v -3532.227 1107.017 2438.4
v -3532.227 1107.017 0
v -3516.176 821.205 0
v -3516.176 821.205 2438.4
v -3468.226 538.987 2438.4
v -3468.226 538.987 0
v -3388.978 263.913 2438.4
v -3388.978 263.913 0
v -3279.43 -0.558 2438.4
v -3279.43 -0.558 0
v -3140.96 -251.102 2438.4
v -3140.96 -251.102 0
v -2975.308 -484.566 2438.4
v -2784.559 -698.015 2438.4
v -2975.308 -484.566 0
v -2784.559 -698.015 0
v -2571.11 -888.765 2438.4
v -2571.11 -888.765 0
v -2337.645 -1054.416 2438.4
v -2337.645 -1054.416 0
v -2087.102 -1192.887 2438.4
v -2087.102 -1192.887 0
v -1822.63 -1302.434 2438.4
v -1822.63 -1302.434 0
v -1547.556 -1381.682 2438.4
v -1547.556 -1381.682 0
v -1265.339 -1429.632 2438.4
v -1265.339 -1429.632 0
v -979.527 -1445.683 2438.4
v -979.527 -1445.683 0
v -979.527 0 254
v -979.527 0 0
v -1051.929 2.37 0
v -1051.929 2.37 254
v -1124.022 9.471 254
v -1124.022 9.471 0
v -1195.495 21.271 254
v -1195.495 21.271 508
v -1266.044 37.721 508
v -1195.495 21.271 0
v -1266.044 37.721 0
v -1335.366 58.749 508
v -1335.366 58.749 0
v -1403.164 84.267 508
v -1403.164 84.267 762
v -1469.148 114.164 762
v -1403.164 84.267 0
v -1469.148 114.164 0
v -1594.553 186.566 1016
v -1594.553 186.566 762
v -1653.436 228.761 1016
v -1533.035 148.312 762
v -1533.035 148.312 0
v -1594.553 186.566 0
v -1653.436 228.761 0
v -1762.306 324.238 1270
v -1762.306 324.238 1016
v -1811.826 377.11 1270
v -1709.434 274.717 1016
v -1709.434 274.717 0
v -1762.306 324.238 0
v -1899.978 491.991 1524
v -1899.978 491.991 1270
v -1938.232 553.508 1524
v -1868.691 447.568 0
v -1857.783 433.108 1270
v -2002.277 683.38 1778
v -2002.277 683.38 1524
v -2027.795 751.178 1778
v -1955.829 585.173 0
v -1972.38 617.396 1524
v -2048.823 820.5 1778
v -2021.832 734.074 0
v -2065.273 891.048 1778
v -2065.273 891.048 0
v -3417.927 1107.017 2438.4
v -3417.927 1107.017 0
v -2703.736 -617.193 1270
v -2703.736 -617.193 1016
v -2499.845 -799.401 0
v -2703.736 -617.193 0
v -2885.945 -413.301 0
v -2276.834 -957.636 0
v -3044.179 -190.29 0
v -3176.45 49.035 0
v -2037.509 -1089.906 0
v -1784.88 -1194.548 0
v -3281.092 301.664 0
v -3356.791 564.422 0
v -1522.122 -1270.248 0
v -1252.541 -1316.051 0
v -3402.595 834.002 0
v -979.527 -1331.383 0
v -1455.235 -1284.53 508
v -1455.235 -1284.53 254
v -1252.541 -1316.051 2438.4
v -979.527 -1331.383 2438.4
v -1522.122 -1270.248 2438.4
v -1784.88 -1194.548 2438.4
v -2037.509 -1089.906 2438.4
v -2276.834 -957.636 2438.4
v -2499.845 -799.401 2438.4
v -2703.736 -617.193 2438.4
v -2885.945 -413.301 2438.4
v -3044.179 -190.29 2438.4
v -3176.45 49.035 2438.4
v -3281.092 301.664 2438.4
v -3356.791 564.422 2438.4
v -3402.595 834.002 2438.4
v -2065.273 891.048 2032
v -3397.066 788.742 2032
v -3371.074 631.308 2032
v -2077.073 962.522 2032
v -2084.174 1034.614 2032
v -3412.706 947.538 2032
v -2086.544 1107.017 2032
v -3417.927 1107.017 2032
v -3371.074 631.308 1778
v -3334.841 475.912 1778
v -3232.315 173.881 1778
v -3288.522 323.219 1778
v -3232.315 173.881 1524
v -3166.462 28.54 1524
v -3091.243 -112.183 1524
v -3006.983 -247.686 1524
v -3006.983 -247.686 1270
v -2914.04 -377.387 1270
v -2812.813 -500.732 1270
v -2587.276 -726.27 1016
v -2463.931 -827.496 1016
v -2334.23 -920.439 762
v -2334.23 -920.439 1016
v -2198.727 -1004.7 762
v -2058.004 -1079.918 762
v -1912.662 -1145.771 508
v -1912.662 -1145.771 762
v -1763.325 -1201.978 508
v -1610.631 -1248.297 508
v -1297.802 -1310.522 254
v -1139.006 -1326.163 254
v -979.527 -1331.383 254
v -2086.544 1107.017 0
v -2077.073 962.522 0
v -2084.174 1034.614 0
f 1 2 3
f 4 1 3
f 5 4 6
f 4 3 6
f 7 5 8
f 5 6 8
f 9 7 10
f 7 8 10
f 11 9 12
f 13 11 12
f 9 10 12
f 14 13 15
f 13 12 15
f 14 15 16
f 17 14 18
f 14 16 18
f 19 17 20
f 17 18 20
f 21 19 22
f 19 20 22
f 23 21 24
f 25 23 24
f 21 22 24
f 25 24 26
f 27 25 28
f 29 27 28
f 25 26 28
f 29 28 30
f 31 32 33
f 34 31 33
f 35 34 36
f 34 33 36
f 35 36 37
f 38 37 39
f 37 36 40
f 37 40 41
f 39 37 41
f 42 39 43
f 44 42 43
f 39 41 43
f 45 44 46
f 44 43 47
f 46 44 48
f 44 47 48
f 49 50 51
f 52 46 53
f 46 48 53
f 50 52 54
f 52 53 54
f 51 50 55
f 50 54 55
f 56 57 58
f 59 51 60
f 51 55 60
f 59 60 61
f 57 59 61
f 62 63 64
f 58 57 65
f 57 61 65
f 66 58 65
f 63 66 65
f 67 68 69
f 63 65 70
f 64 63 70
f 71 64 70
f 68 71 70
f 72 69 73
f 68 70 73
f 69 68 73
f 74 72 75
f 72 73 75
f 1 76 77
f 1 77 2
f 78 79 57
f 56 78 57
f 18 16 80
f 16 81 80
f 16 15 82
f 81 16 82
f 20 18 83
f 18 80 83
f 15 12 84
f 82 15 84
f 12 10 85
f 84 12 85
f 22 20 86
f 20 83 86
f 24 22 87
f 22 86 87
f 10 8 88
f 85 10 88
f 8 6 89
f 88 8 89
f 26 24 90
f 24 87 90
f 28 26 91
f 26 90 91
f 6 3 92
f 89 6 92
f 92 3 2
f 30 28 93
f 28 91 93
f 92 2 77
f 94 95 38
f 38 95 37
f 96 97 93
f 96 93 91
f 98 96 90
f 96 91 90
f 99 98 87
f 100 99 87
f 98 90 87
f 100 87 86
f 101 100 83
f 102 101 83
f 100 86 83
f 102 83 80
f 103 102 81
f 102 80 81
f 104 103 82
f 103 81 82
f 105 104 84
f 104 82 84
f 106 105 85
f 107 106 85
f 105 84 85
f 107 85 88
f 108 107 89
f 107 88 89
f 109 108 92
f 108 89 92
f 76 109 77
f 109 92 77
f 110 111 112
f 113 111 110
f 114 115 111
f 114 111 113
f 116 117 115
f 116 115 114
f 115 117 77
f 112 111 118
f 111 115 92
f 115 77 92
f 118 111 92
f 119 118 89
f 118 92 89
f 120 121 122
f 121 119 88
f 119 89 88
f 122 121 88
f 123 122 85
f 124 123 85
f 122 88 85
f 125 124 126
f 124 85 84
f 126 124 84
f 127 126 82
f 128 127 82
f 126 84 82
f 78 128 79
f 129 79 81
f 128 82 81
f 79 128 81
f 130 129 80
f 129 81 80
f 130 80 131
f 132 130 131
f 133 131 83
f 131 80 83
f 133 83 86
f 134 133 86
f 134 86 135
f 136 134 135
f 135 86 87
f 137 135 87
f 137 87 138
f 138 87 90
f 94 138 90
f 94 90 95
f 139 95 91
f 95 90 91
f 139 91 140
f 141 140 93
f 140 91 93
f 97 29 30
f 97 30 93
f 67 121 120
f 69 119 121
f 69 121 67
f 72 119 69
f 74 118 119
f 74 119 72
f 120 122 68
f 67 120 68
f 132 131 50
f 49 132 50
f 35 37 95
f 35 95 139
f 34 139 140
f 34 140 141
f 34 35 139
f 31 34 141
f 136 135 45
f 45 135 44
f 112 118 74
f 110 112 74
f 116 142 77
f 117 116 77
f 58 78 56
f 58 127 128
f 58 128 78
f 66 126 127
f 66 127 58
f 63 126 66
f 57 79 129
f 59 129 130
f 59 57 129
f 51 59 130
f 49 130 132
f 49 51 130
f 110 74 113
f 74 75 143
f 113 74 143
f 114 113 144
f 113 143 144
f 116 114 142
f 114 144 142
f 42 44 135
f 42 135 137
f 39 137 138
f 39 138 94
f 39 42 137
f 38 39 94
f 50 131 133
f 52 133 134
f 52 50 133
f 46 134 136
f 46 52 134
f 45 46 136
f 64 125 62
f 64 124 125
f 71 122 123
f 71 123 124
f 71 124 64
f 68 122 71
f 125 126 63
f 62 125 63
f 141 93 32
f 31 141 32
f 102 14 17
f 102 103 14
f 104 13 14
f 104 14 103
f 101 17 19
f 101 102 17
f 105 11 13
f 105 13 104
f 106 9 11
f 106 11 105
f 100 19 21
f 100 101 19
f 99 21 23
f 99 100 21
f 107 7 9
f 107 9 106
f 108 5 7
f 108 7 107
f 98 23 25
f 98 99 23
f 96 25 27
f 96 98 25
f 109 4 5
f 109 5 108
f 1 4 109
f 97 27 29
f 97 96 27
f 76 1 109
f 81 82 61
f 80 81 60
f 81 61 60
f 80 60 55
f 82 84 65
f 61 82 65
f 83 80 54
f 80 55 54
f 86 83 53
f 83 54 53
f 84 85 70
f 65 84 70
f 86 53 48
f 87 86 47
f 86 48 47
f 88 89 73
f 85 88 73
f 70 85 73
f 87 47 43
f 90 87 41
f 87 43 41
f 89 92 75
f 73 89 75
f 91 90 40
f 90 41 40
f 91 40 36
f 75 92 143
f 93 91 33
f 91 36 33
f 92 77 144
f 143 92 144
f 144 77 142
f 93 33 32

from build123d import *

# Parameters (mm, degrees)
F10_DEPTH = 254
F11_DEPTH = 508
F12_DEPTH = 762
F13_DEPTH = 1016
F14_DEPTH = 1270
F15_DEPTH = 1524
F16_DEPTH = 1778
F17_DEPTH = 2032
F19_DEPTH = 2438.4


# Not quite as in the source:
# - a variable given as a bare number and used for a length is read in inches; the dataset says mm whatever the document's units were


with BuildPart() as f10:
    # F2 (on Top) → F10 (new body)
    with BuildSketch(Plane.XY):
        with BuildLine():
            Line((-979.52713178, -1331.3833333333), (-979.52713178, 0))
            ThreePointArc((-979.52713178, 0), (-1088.0337397438, 5.3305878284), (-1195.4953697572, 21.271014839))
            Line((-1195.4953697572, 21.271014839), (-1455.2353729841, -1284.5301610686))
            ThreePointArc((-1455.2353729841, -1284.5301610686), (-1218.5321267596, -1319.6417708508), (-979.52713178, -1331.3833333333))
        make_face()
    extrude(amount=F10_DEPTH)

    # F3 (on Top) → F11 (join)
    with BuildSketch(Plane.XY):
        with BuildLine():
            Line((-1455.2353729841, -1284.5301610686), (-1195.4953697572, 21.271014839))
            ThreePointArc((-1195.4953697572, 21.271014839), (-1300.8771075786, 47.6677660055), (-1403.1640694653, 84.2666261845))
            Line((-1403.1640694653, 84.2666261845), (-1912.662413259, -1145.7711854089))
            ThreePointArc((-1912.662413259, -1145.7711854089), (-1687.3572887973, -1226.3866479828), (-1455.2353729841, -1284.5301610686))
        make_face()
    extrude(amount=F11_DEPTH)

    # F4 (on Top) → F12 (join)
    with BuildSketch(Plane.XY):
        with BuildLine():
            Line((-1912.662413259, -1145.7711854089), (-1403.1640694653, 84.2666261845))
            ThreePointArc((-1403.1640694653, 84.2666261845), (-1501.3711760586, 130.7151283453), (-1594.5526392366, 186.5659480209))
            Line((-1594.5526392366, 186.5659480209), (-2334.229587975, -920.4388359719))
            ThreePointArc((-2334.229587975, -920.4388359719), (-2128.9809348565, -1043.4601443204), (-1912.662413259, -1145.7711854089))
        make_face()
    extrude(amount=F12_DEPTH)

    # F5 (on Top) → F13 (join)
    with BuildSketch(Plane.XY):
        with BuildLine():
            Line((-2334.229587975, -920.4388359719), (-1594.5526392366, 186.5659480209))
            ThreePointArc((-1594.5526392366, 186.5659480209), (-1681.8110705705, 251.2812112866), (-1762.3061236665, 324.2376747801))
            Line((-1762.3061236665, 324.2376747801), (-2703.7363070253, -617.1925085786))
            ThreePointArc((-2703.7363070253, -617.1925085786), (-2526.4317158846, -777.892022813), (-2334.229587975, -920.4388359719))
        make_face()
    extrude(amount=F13_DEPTH)

    # F6 (on Top) → F14 (join)
    with BuildSketch(Plane.XY):
        with BuildLine():
            Line((-2703.7363070253, -617.1925085786), (-1762.3061236665, 324.2376747801))
            ThreePointArc((-1762.3061236665, 324.2376747801), (-1835.2625871601, 404.7327278761), (-1899.9778504258, 491.9911592101))
            Line((-1899.9778504258, 491.9911592101), (-3006.9826344185, -247.6857895283))
            ThreePointArc((-3006.9826344185, -247.6857895283), (-2864.4358212597, -439.887917438), (-2703.7363070253, -617.1925085786))
        make_face()
    extrude(amount=F14_DEPTH)

    # F7 (on Top) → F15 (join)
    with BuildSketch(Plane.XY):
        with BuildLine():
            Line((-3006.9826344185, -247.6857895283), (-1899.9778504258, 491.9911592101))
            ThreePointArc((-1899.9778504258, 491.9911592101), (-1955.8286701014, 585.172622388), (-2002.2771722622, 683.3797289813))
            Line((-2002.2771722622, 683.3797289813), (-3232.3149838555, 173.8813851876))
            ThreePointArc((-3232.3149838555, 173.8813851876), (-3130.003942767, -42.4371364098), (-3006.9826344185, -247.6857895283))
        make_face()
    extrude(amount=F15_DEPTH)

    # F8 (on Top) → F16 (join)
    with BuildSketch(Plane.XY):
        with BuildLine():
            Line((-3232.3149838555, 173.8813851876), (-2002.2771722622, 683.3797289813))
            ThreePointArc((-2002.2771722622, 683.3797289813), (-2038.8760324411, 785.666690868), (-2065.2727836077, 891.0484286894))
            Line((-2065.2727836077, 891.0484286894), (-3371.0739595152, 631.3084254625))
            ThreePointArc((-3371.0739595152, 631.3084254625), (-3312.9304464294, 399.1865096494), (-3232.3149838555, 173.8813851876))
        make_face()
    extrude(amount=F16_DEPTH)

    # F9 (on Top) → F17 (join)
    with BuildSketch(Plane.XY):
        with BuildLine():
            Line((-3371.0739595152, 631.3084254625), (-2065.2727836077, 891.0484286894))
            ThreePointArc((-2065.2727836077, 891.0484286894), (-2081.2132106182, 998.5100587028), (-2086.5437984467, 1107.0166666667))
            Line((-2086.5437984467, 1107.0166666667), (-3417.92713178, 1107.0166666667))
            ThreePointArc((-3417.92713178, 1107.0166666667), (-3406.1855692975, 868.0116716871), (-3371.0739595152, 631.3084254625))
        make_face()
    extrude(amount=F17_DEPTH)


with BuildPart() as f19:
    # F18 (on Top) → F19 (new body)
    with BuildSketch(Plane.XY):
        with BuildLine():
            ThreePointArc((-979.52713178, -1331.3833333333), (-2703.7363070253, -617.1925085786), (-3417.92713178, 1107.0166666667))
            Line((-3417.92713178, 1107.0166666667), (-3532.22713178, 1107.0166666667))
            ThreePointArc((-3532.22713178, 1107.0166666667), (-2784.5586121149, -698.0148136682), (-979.52713178, -1445.6833333333))
            Line((-979.52713178, -1445.6833333333), (-979.52713178, -1331.3833333333))
        make_face()
    extrude(amount=F19_DEPTH)


solid = Compound([f10.part, f19.part])
